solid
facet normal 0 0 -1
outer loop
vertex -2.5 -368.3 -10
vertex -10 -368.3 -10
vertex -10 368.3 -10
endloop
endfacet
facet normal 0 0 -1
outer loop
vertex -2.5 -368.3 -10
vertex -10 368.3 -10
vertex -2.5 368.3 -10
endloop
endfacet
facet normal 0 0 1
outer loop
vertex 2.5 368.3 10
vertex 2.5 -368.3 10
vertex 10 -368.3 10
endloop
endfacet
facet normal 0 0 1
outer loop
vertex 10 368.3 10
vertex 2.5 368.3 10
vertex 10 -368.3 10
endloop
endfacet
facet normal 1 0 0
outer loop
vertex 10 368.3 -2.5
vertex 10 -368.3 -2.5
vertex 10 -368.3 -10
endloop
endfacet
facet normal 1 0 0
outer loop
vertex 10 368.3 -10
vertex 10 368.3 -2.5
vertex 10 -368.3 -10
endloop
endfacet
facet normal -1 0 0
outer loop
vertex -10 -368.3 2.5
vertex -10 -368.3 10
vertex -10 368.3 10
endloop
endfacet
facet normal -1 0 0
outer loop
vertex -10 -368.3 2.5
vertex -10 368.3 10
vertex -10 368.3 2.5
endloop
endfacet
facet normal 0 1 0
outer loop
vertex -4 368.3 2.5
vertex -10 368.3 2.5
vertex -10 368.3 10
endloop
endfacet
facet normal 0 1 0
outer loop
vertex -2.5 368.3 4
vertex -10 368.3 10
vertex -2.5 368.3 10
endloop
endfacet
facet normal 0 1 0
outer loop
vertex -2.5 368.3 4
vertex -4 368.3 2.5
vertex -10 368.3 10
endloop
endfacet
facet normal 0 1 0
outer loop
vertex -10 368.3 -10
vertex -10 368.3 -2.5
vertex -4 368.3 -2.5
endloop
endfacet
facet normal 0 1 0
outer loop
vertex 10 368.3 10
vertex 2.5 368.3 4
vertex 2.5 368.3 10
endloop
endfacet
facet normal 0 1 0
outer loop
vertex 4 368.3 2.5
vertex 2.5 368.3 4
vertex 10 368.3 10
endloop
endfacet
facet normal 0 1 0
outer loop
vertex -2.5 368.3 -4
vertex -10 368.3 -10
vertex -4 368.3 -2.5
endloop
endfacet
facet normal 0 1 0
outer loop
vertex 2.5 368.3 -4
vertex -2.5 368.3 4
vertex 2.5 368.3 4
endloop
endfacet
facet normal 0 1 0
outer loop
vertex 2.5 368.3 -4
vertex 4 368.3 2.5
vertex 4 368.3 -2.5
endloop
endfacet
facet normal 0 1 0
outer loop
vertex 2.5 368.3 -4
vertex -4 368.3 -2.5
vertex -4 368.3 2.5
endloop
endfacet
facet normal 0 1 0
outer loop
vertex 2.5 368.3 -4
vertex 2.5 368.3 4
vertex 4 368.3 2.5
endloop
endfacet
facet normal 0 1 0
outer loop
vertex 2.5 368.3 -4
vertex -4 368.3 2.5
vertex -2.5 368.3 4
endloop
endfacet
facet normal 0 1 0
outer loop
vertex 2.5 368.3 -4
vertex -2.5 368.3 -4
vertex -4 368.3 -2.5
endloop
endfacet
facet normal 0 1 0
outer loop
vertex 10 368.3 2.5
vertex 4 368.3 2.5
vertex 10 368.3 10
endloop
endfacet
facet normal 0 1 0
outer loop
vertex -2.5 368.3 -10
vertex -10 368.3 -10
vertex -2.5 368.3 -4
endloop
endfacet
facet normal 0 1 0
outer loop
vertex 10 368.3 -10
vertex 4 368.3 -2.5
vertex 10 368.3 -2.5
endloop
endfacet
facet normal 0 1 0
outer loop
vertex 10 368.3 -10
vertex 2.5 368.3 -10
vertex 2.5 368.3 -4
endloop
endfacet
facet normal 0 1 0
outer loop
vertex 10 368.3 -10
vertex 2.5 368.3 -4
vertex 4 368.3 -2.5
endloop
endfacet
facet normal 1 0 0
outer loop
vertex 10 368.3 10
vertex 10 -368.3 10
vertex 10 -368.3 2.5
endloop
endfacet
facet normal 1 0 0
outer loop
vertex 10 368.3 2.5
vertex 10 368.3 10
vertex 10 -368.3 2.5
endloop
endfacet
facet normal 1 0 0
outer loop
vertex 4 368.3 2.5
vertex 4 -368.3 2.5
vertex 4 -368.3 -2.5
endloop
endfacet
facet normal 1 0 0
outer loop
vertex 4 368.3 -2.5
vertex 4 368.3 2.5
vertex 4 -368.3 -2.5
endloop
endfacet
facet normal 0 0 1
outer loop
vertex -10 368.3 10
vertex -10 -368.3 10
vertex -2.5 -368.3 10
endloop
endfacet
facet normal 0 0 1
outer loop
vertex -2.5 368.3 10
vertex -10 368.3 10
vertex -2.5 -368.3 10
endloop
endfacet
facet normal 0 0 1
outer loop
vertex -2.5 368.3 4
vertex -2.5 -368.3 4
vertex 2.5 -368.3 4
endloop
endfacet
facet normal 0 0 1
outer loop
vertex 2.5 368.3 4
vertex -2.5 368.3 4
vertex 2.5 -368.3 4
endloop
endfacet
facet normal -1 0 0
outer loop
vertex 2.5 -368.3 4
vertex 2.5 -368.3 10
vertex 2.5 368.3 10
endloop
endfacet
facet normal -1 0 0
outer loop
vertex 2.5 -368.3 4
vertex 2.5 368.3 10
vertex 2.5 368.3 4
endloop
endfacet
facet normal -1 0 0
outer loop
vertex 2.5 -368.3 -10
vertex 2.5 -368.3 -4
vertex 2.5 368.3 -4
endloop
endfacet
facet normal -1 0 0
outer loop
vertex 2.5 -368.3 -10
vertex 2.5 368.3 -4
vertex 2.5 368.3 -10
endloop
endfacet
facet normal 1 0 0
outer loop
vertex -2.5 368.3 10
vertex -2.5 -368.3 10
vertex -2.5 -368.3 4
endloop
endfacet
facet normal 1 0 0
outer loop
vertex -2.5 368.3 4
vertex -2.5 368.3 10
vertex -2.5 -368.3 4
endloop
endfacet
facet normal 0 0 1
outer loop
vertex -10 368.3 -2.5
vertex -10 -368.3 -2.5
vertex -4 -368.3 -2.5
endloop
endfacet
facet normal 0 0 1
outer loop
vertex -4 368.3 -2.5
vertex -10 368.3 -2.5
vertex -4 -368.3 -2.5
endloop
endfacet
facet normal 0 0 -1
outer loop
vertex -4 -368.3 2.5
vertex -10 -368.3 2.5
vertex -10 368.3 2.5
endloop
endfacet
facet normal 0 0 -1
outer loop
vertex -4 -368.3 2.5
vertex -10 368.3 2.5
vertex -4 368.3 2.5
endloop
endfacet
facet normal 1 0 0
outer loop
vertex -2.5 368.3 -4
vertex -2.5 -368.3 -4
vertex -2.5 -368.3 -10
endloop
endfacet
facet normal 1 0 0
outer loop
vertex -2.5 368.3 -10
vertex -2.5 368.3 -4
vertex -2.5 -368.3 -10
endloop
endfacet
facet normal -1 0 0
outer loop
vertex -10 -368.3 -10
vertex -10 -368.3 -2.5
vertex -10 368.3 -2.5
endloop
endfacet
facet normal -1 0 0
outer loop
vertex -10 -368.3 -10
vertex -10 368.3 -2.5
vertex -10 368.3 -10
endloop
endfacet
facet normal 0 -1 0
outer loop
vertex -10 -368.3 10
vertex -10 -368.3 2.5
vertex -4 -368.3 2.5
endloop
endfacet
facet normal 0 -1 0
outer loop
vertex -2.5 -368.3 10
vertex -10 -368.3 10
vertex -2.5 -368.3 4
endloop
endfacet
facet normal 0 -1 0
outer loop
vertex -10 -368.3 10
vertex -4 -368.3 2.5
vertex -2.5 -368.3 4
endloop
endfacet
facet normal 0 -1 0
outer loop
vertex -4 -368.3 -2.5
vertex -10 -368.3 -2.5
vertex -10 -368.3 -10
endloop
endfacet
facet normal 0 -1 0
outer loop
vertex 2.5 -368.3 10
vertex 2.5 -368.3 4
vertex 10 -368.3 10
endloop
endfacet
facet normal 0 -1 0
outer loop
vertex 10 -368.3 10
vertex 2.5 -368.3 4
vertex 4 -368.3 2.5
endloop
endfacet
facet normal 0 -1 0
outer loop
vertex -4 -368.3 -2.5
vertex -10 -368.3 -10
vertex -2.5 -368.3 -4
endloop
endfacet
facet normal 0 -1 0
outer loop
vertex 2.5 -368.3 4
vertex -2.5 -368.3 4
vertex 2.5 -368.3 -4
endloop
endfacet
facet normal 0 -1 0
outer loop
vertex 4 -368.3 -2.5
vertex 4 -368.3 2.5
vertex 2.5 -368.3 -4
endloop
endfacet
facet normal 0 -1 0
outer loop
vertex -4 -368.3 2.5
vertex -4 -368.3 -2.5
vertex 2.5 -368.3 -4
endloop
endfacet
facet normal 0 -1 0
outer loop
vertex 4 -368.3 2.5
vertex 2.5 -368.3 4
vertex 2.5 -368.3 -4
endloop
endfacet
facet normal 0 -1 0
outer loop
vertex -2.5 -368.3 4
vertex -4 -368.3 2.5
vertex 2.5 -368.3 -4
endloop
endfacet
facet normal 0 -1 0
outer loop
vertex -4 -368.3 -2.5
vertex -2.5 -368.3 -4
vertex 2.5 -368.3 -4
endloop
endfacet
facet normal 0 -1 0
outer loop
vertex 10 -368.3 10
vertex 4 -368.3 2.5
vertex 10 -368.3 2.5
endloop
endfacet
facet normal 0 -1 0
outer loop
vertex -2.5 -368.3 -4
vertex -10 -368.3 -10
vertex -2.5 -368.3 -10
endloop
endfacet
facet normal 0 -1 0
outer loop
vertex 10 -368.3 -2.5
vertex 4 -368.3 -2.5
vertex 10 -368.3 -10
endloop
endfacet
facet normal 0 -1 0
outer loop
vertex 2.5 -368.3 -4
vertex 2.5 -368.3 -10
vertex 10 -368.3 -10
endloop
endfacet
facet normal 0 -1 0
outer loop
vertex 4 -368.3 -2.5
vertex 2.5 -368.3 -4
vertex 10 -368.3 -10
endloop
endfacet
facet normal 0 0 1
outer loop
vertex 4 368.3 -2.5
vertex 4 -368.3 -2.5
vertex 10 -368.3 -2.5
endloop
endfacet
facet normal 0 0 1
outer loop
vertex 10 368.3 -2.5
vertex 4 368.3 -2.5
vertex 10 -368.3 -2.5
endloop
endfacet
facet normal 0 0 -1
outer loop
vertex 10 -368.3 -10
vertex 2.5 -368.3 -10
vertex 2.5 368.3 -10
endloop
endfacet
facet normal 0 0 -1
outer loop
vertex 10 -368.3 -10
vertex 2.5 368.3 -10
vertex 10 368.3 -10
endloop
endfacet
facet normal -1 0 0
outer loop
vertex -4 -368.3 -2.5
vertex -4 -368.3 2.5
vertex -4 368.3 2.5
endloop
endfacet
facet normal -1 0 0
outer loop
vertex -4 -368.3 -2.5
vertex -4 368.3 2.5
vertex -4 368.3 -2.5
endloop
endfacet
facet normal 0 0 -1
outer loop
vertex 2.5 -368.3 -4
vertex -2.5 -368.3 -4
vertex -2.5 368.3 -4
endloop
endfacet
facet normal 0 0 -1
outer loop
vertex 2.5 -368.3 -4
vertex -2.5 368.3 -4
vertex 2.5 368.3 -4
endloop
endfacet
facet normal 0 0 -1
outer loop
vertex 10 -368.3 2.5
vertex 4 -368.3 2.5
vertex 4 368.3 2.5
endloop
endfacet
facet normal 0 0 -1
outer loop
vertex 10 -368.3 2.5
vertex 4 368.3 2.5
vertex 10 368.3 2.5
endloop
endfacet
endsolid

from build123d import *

# Parameters (mm, degrees)
BOSS_EXTRUDE1_DEPTH      = 368.3
BOSS_EXTRUDE1_DEPTH_BACK = 368.3
SKETCH1_W                = 20
SKETCH1_H                = 20
CUT_EXTRUDE1_DEPTH       = 369.571417774
CUT_EXTRUDE1_DEPTH_BACK  = 369.571417774
SKETCH2_W                = 5
SKETCH2_H                = 12
SKETCH2_W_2              = 12
SKETCH2_H_2              = 5


with BuildPart() as part:
    # Sketch1 → Boss-Extrude1 (new, two sides: drawn at the far end of the back side and taken through both)
    with BuildSketch(Plane(origin=(0, 0, 0), x_dir=(1, 0, 0), z_dir=(0, 1, 0)).offset(-BOSS_EXTRUDE1_DEPTH_BACK)):
        Rectangle(SKETCH1_W, SKETCH1_H)
    extrude(amount=BOSS_EXTRUDE1_DEPTH + BOSS_EXTRUDE1_DEPTH_BACK)

    # Sketch2 → Cut-Extrude1 (cut, two sides: drawn at the far end of the back side and taken through both)
    with BuildSketch(Plane(origin=(0, 0, 0), x_dir=(1, 0, 0), z_dir=(0, 1, 0)).offset(-CUT_EXTRUDE1_DEPTH_BACK)):
        with Locations((0, 10)):
            Rectangle(SKETCH2_W, SKETCH2_H)
        with Locations((10, 0)):
            Rectangle(SKETCH2_W_2, SKETCH2_H_2)
        with Locations((-10, 0)):
            Rectangle(SKETCH2_W_2, SKETCH2_H_2)
        with Locations((0, -10)):
            Rectangle(SKETCH2_W, SKETCH2_H)
    extrude(amount=CUT_EXTRUDE1_DEPTH + CUT_EXTRUDE1_DEPTH_BACK, mode=Mode.SUBTRACT)


solid = part.part
